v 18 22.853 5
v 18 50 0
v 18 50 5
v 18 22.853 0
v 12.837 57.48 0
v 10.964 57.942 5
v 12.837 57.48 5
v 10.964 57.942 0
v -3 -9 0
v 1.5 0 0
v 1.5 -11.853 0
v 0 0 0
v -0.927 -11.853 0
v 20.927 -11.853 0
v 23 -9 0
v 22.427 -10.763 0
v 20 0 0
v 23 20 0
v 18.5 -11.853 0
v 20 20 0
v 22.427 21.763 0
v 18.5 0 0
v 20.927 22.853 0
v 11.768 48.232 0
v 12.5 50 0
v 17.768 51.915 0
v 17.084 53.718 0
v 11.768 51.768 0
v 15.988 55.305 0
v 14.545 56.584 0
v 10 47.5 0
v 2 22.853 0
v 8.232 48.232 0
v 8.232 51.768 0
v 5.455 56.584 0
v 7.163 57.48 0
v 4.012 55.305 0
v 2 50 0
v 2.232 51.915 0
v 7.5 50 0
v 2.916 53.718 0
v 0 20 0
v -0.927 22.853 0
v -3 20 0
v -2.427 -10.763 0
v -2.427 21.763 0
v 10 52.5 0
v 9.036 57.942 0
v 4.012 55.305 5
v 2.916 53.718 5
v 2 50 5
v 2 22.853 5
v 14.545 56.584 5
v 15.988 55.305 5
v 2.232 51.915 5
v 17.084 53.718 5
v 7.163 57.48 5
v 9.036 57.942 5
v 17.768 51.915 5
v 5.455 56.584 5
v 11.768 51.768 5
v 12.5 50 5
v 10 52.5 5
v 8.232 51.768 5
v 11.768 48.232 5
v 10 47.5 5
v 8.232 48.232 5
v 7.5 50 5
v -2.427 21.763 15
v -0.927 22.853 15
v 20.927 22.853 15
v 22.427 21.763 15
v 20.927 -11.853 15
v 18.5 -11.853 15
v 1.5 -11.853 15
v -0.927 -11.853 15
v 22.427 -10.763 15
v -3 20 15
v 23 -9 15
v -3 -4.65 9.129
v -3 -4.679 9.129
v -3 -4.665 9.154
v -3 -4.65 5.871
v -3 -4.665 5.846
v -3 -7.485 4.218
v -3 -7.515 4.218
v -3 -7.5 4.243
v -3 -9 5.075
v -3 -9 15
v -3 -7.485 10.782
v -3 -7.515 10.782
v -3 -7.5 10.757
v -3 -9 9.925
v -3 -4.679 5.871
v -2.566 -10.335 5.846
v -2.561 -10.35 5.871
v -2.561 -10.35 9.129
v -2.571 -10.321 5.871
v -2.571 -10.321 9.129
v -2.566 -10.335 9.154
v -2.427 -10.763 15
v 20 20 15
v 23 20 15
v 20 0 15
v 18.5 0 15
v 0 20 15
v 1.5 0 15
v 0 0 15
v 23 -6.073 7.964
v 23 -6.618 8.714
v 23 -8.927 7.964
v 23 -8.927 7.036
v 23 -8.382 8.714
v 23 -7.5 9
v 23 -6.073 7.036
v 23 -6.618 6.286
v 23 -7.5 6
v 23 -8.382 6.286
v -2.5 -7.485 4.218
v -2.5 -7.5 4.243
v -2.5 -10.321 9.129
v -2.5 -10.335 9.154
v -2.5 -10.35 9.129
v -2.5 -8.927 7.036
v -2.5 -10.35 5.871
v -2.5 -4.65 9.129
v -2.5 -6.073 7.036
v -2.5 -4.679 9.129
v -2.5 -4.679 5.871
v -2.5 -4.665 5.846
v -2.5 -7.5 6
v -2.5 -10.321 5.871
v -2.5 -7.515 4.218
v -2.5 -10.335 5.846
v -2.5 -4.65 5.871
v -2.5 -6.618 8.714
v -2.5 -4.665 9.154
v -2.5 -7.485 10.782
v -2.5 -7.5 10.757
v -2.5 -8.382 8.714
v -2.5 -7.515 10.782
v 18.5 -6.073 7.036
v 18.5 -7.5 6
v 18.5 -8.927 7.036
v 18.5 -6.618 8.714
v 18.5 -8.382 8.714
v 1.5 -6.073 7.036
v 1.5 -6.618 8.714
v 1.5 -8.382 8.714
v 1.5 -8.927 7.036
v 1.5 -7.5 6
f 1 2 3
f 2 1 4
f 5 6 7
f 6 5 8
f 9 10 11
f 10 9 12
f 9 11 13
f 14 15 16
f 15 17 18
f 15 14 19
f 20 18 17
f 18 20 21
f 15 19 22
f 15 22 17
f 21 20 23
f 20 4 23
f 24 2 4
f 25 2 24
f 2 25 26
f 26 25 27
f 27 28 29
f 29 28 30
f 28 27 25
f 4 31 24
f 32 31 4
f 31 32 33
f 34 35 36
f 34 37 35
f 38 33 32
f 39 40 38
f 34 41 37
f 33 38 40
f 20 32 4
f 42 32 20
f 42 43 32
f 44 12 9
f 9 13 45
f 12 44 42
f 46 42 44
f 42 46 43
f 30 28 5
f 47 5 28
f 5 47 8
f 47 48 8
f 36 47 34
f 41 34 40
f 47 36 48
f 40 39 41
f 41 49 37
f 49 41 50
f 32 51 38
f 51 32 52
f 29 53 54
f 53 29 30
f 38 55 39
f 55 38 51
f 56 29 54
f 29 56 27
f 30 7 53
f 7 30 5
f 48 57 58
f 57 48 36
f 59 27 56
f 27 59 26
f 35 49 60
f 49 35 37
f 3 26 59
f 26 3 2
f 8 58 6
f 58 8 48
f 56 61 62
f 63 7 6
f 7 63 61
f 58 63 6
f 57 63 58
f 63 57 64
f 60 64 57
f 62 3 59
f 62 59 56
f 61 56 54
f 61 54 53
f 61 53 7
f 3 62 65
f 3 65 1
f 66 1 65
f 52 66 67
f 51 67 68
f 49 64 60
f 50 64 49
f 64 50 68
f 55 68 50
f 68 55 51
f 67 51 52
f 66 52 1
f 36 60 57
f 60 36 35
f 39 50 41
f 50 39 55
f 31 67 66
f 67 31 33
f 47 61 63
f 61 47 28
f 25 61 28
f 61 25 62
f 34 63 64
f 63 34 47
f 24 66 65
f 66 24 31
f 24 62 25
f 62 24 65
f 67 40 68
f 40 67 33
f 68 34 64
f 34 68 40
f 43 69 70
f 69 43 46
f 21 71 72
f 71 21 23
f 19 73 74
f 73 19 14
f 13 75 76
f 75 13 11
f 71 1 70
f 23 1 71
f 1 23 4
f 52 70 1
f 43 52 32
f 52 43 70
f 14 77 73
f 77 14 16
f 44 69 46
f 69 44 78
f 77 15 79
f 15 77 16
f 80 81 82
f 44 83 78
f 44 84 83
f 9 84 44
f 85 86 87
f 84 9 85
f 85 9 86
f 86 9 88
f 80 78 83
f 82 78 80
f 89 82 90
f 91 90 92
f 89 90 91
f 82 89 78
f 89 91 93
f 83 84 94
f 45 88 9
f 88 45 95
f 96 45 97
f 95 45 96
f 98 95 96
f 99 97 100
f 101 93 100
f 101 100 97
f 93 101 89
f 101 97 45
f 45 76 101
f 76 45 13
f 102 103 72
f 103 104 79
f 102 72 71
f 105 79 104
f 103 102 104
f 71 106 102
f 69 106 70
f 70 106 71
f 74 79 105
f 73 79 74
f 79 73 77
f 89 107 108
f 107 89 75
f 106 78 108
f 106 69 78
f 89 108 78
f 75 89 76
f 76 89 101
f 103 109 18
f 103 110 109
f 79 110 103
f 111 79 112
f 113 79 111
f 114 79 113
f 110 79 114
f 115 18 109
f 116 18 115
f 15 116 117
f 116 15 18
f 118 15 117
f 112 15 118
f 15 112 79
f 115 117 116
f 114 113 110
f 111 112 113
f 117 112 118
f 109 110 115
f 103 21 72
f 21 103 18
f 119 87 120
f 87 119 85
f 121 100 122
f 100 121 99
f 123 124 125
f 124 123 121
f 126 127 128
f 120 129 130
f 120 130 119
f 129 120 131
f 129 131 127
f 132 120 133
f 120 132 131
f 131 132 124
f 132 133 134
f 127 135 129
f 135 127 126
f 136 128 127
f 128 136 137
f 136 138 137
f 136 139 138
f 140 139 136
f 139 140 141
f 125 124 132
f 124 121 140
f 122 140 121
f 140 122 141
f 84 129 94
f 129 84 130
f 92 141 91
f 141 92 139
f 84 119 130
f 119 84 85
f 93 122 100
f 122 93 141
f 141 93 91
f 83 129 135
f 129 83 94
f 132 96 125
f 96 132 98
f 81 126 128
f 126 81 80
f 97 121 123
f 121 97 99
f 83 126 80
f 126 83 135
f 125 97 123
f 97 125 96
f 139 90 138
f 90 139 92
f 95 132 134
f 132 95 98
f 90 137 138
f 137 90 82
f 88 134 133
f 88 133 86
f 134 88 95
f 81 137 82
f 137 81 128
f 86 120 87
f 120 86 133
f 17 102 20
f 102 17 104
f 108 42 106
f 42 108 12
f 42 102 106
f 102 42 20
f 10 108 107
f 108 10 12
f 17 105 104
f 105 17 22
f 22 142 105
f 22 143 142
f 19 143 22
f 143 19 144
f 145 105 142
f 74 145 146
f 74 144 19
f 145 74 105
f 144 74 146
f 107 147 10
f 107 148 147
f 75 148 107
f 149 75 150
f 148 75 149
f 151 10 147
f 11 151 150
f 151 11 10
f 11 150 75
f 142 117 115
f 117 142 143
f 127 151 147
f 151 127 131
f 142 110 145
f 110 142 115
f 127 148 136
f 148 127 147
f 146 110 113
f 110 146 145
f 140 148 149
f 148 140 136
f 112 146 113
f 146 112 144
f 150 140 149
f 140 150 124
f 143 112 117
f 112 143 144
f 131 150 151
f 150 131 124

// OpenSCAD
width = 15;
outer_hole_dia = 5;
expanded_part_width = 16;

// size is the XY plane size, height in Z
module hexagon(size, height) {
  boxWidth = size/1.75;
  for (r = [-60, 0, 60]) rotate([0,0,r]) cube([boxWidth, size, height], true);
}

module holder() {


difference() {

union() {

translate([0, -9, 0])
minkowski()
{
   cube([20,29,width-1]);
   cylinder(r=3,h=1);
}


difference() {
  hull()
  {
    translate([10, 12.5, 0])
    cylinder(r=expanded_part_width/2,h=5);
    translate([10, 50, 0])
    cylinder(r=expanded_part_width/2,h=5);
  }

  translate([10, 50, -1])
  cylinder(r=outer_hole_dia/2,h=7);
}
}

// hole for main extrusion
   translate([0, 0, -1])
   cube([20,20,22]);

// for screw part
   translate([1.5, -16, -1])
   cube([17,20,22]);


// screw holes

translate([-4,-7.5, width/2])
rotate(a=90, v=[0,1,0])
hexagon(5.7, 3);

translate([23,-7.5, width/2])
rotate(a=90, v=[0,1,0])
cylinder(r2=3, r1=1.5, h=3);

translate([-10,-7.5, width/2])
rotate(a=90, v=[0,1,0])
cylinder(r=1.5, h=40);

}

}

holder();
